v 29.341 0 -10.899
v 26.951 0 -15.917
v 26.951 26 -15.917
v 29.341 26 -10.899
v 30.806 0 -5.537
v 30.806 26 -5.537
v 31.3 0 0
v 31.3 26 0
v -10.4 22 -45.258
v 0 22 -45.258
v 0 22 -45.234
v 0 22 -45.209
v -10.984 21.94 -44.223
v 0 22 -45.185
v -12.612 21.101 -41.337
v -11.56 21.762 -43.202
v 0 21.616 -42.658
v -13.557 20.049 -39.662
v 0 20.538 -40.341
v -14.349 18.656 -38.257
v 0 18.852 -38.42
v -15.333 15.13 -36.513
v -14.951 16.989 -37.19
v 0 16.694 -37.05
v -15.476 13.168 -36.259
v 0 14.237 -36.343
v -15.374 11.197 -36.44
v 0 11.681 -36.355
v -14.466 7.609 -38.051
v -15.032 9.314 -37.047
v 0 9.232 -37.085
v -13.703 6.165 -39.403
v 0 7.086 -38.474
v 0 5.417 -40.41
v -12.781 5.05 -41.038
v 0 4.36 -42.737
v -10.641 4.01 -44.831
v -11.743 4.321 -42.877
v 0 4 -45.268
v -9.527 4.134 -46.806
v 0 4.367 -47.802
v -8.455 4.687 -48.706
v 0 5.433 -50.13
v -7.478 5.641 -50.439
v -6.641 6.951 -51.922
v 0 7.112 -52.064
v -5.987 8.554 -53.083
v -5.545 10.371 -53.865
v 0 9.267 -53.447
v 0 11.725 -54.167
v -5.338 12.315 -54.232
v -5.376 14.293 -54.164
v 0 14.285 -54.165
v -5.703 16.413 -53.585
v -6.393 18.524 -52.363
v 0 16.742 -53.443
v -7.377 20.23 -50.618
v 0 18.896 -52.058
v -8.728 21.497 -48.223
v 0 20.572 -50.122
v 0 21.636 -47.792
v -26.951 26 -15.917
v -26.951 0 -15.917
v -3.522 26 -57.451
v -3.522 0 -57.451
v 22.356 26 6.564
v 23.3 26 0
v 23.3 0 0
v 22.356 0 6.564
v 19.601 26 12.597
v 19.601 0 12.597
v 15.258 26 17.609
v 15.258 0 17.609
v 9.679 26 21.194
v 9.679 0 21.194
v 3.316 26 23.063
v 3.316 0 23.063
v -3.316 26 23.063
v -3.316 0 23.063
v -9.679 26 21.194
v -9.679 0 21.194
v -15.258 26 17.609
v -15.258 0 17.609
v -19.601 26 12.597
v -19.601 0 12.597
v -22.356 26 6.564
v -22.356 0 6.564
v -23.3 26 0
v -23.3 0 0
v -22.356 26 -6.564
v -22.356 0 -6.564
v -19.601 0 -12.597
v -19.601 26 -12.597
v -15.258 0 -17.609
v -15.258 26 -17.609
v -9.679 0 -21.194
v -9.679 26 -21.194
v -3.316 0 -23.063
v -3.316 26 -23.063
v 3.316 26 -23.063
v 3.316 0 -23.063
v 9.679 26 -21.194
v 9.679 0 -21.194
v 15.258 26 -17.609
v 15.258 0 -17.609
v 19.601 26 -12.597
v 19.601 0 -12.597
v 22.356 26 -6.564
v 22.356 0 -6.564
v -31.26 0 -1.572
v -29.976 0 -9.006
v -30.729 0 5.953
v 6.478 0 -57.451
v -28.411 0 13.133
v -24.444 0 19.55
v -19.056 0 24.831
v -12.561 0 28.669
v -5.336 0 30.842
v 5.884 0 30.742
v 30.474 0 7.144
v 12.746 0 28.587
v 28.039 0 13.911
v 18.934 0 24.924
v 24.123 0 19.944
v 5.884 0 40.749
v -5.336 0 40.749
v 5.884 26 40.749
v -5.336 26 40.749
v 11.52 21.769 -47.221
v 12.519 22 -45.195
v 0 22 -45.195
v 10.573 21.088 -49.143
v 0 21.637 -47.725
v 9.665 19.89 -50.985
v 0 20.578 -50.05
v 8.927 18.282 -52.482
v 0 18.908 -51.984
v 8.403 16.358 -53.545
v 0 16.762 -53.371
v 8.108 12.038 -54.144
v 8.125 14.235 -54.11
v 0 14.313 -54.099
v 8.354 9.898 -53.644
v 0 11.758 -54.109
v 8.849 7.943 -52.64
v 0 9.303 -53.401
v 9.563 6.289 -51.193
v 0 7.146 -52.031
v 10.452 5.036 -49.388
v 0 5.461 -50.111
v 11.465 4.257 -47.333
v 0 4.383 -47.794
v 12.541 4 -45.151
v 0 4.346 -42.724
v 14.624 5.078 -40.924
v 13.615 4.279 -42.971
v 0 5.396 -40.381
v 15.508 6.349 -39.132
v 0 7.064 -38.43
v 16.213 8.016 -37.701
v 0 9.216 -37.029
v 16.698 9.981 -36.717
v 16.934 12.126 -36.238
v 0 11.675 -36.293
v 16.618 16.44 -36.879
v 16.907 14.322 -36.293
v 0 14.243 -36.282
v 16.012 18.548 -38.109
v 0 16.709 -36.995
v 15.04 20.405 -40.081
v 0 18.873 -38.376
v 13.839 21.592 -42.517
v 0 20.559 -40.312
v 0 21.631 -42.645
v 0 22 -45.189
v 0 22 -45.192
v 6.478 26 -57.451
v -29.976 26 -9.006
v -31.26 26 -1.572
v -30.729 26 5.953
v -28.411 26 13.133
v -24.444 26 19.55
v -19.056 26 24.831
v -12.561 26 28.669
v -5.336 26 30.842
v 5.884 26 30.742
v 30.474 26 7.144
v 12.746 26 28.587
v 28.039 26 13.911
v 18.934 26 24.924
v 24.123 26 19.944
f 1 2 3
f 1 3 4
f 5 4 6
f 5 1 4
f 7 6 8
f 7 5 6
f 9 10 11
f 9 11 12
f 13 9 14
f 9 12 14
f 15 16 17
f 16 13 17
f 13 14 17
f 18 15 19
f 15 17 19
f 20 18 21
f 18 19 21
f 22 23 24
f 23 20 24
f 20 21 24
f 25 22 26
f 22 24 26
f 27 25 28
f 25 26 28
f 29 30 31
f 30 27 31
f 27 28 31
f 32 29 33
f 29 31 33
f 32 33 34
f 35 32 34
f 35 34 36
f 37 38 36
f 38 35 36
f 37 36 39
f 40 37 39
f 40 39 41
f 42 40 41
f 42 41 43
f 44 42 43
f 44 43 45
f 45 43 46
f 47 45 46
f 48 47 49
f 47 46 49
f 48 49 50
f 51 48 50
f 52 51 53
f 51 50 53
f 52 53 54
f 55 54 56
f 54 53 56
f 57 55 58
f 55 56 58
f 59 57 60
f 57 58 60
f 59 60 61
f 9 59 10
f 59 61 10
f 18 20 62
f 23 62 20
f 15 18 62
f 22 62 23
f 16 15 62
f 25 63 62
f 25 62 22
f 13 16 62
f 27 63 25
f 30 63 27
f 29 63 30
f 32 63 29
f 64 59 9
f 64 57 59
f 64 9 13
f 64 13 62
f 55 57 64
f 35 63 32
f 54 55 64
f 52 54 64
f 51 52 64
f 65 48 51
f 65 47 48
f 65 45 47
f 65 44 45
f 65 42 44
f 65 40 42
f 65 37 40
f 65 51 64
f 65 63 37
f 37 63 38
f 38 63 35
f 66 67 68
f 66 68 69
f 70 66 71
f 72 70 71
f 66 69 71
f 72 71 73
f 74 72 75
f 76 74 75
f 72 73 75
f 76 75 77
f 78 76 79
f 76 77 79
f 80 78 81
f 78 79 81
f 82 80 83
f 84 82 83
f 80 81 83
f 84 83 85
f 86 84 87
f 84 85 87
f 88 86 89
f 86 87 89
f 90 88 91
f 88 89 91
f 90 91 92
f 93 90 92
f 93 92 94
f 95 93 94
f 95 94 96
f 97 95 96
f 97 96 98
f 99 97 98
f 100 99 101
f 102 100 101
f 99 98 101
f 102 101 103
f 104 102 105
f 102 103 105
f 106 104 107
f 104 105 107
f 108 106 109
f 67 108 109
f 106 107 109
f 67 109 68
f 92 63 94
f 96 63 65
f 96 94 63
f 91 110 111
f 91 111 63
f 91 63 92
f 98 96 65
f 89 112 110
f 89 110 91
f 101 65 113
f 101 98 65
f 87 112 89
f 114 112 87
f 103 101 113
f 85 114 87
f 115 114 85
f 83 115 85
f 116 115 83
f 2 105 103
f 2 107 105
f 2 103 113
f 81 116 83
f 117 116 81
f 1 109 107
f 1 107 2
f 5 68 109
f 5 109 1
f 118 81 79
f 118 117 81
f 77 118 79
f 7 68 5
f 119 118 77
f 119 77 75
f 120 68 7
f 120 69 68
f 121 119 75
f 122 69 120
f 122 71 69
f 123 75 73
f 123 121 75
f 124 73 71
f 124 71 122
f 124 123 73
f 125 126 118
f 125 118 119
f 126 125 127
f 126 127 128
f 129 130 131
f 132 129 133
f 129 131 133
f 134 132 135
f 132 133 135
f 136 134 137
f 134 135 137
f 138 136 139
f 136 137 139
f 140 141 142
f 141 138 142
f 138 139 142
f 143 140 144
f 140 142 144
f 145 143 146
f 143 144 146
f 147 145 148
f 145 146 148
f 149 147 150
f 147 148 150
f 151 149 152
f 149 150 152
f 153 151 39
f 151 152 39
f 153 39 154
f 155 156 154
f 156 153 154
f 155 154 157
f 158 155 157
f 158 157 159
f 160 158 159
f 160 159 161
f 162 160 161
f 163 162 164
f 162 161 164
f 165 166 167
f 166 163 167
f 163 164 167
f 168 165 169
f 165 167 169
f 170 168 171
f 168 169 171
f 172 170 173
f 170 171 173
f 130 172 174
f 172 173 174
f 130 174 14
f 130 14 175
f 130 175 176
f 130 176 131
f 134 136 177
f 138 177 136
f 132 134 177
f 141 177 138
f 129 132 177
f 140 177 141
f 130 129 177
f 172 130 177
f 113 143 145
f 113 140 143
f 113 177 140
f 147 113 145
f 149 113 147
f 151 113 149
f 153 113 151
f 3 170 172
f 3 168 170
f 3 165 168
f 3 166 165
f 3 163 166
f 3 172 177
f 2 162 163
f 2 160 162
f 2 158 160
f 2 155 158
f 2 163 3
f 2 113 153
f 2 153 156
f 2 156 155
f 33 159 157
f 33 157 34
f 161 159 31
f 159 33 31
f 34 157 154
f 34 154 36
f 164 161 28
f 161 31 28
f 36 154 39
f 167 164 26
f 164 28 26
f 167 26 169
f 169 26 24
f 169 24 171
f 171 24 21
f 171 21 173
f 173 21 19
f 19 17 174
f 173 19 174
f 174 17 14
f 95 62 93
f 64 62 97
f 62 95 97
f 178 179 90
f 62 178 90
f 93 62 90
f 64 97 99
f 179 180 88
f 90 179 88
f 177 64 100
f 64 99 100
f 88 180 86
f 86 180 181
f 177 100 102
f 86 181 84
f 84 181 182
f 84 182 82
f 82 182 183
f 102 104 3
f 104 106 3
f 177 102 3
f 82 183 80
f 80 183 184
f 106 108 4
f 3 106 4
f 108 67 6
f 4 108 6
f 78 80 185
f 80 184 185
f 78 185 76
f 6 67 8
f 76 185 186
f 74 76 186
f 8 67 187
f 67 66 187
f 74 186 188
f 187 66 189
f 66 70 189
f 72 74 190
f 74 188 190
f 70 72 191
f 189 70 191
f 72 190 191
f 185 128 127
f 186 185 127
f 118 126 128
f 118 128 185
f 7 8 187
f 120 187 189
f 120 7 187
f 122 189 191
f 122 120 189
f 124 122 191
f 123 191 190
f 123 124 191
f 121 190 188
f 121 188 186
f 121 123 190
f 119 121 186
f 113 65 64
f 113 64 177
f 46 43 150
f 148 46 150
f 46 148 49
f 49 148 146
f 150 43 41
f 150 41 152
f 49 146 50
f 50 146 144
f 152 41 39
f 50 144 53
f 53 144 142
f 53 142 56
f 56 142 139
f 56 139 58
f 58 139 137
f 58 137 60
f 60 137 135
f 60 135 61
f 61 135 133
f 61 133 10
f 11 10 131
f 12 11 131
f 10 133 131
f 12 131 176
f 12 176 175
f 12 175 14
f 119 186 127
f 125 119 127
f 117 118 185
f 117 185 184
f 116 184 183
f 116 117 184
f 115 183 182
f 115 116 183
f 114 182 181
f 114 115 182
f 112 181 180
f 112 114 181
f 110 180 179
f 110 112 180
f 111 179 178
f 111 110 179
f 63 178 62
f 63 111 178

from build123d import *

# Parameters (mm, degrees)
F0_R     = 23.3
F2_DEPTH = 26
F3_D     = 18
F3_DEPTH = 31.301
F4_D     = 18
F4_DEPTH = 31.301


with BuildPart() as f2:
    # F0 (on Front) → F2 (new body)
    with BuildSketch(Plane.XZ):
        with BuildLine():
            ThreePointArc((-5.3364344982, 30.8417325526), (0.278406123, 31.2987617971), (5.8842282742, 30.7419234534))
            Line((5.8842282742, 30.7419234534), (5.8842282742, 40.749304027))
            Line((5.8842282742, 40.749304027), (-5.3364344982, 40.749304027))
            Line((-5.3364344982, 40.749304027), (-5.3364344982, 30.8417325526))
        make_face()
        with BuildLine():
            ThreePointArc((26.9505900946, -15.9171509245), (30.1930742883, -8.2503493877), (31.3, 0))
            ThreePointArc((31.3, 0), (24.1232910792, 19.9438418442), (5.8842282742, 30.7419234534))
            ThreePointArc((5.8842282742, 30.7419234534), (0.278406123, 31.2987617971), (-5.3364344982, 30.8417325526))
            ThreePointArc((-5.3364344982, 30.8417325526), (-28.4114639762, 13.1331151952), (-26.9505900946, -15.9171509245))
            ThreePointArc((-26.9505900946, -15.9171509245), (-14.8696278527, -27.5424067126), (1.4777821376, -31.2650949136))
            ThreePointArc((1.4777821376, -31.2650949136), (16.1534186201, -26.8096450347), (26.9505900946, -15.9171509245))
        make_face()
        Circle(F0_R, mode=Mode.SUBTRACT)
        with BuildLine():
            Line((6.4777821376, -57.4513469467), (26.9505900946, -15.9171509245))
            ThreePointArc((26.9505900946, -15.9171509245), (16.1534186201, -26.8096450347), (1.4777821376, -31.2650949136))
            Line((1.4777821376, -31.2650949136), (1.4777821376, -57.4513469467))
            Line((1.4777821376, -57.4513469467), (6.4777821376, -57.4513469467))
        make_face()
        with BuildLine():
            Line((1.4777821376, -57.4513469467), (1.4777821376, -31.2650949136))
            ThreePointArc((1.4777821376, -31.2650949136), (-14.8696278527, -27.5424067126), (-26.9505900946, -15.9171509245))
            Line((-26.9505900946, -15.9171509245), (-3.5222178624, -57.4513469467))
            Line((-3.5222178624, -57.4513469467), (1.4777821376, -57.4513469467))
        make_face()
    extrude(amount=-F2_DEPTH)

    # F3 (through all, one way)
    with BuildSketch(Plane.YZ):
        with Locations((13, -45.2576093376)):
            Circle(F3_D / 2)
    extrude(amount=-F3_DEPTH, mode=Mode.SUBTRACT)

    # F4 (through all, one way)
    with BuildSketch(Plane(origin=(0, 0, 0), x_dir=(0, 1, 0), z_dir=(-1, 0, 0))):
        with Locations((12.9997157162, 45.1954063838)):
            Circle(F4_D / 2)
    extrude(amount=-F4_DEPTH, mode=Mode.SUBTRACT)


solid = f2.part
